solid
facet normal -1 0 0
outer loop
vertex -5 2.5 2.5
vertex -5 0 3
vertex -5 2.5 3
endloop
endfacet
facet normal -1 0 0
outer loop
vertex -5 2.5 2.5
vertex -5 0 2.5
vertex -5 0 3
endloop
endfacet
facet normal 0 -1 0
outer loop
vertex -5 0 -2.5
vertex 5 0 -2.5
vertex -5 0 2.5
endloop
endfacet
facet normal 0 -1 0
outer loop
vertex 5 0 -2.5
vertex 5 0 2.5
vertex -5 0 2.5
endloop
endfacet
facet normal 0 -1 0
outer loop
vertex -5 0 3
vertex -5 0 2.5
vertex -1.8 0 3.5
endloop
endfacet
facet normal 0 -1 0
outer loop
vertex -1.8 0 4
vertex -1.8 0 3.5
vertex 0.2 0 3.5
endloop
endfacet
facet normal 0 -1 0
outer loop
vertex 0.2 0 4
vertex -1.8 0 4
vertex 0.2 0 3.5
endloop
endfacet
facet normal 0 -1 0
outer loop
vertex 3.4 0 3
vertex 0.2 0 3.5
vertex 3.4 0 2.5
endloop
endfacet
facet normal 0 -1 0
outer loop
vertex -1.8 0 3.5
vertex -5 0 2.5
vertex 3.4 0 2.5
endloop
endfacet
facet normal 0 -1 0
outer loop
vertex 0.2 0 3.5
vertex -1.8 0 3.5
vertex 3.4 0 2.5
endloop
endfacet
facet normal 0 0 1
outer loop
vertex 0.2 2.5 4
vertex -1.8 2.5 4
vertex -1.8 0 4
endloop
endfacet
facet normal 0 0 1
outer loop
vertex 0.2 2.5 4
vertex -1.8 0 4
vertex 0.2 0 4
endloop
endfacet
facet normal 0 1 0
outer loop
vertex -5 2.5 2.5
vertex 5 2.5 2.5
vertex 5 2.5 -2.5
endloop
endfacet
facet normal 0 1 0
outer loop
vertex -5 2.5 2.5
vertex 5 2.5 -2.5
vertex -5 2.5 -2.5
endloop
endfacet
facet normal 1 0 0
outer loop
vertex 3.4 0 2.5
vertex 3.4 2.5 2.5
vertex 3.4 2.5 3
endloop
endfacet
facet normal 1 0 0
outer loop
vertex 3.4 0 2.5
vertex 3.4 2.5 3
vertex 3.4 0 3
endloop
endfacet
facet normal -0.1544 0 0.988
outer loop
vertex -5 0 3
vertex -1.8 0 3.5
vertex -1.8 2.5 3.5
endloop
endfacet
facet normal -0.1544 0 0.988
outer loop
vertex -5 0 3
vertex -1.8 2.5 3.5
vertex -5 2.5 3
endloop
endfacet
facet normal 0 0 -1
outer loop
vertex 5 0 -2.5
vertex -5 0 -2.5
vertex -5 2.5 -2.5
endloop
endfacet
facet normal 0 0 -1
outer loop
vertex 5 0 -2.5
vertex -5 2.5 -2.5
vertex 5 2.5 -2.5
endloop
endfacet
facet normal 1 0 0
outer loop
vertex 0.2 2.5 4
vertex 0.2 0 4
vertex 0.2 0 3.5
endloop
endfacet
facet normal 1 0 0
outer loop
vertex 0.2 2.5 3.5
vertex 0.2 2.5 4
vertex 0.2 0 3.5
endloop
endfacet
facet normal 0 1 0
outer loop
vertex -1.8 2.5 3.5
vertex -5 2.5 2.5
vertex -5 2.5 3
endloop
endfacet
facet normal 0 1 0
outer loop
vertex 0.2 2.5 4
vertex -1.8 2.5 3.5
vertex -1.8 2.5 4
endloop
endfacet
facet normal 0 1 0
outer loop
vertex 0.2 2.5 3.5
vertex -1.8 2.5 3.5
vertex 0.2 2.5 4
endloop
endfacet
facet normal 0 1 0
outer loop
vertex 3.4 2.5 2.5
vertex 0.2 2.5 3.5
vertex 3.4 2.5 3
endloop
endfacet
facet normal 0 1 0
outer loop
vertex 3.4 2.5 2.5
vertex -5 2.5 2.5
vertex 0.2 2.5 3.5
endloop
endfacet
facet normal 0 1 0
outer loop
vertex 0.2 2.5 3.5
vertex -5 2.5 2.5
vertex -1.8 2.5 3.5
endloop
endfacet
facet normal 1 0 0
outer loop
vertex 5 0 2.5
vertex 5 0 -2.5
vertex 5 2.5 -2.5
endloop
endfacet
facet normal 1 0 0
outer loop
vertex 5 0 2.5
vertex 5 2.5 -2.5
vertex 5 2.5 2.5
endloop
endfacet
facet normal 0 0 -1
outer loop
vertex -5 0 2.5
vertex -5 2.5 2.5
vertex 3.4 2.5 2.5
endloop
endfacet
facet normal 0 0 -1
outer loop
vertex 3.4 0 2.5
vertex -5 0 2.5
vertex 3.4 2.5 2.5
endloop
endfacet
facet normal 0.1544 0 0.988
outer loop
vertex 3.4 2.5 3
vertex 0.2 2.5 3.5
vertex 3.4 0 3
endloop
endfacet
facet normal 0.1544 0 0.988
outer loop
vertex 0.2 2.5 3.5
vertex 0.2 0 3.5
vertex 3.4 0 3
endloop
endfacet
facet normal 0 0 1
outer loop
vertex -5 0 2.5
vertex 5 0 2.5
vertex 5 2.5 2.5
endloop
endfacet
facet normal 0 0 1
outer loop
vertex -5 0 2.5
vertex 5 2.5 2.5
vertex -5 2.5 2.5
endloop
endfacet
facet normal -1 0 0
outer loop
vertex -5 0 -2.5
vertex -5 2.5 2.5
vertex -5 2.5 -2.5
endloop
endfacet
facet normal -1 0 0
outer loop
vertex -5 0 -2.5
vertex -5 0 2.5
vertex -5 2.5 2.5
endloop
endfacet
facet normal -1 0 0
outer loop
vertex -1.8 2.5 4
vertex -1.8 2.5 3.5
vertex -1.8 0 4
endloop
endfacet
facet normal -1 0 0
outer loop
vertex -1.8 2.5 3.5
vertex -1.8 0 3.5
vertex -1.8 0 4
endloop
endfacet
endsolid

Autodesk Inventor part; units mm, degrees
ref_plane "YZ Plane" through (0, 0, 0) normal (1, 0, 0) x (0, 1, 0)
ref_plane "XZ Plane" through (0, 0, 0) normal (0, 1, 0) x (-1, 0, 0)
ref_plane "XY Plane" through (0, 0, 0) normal (0, 0, 1) x (1, 0, 0)
sketch "Sketch1" plane through (0, 0, 0) normal (0, 1, 0) x (-1, 0, 0)
  line L0 (5, -2.5) -> (-5, -2.5)
  line L1 (-5, -2.5) -> (-5, 2.5)
  line L2 (-5, 2.5) -> (5, 2.5)
  line L3 (5, 2.5) -> (5, -2.5)
  line L4 (5, -2.5) -> (-5, 2.5) construction
  line L5 (-5, -2.5) -> (5, 2.5) construction
  point P0 (0, 0)
  dimension "d0" = 10
  dimension "d1" = 5
extrude "Extrusion1" add sketch "Sketch1" along normal blind 2.5
sketch "Sketch2" plane through (-5, 0, 2.5) normal (0, 0, 1) x (1, 0, 0)
  line L0 (0, 2.5) -> (10, 2.5) projected
  line L1 (0, 0) -> (10, 0) projected
  line L2 (0, 2.5) -> (8.4, 2.5)
  line L3 (8.4, 2.5) -> (8.4, 0)
  line L4 (8.4, 0) -> (0, 0)
  line L5 (0, 0) -> (0, 2.5)
  point P0 (5, 0)
  dimension "d4" = 8.4
extrude "Extrusion2" add sketch "Sketch2" along normal blind 1.5 separate body
sketch "Sketch3" plane through (-5, 0, 2.5) normal (0, -1, 0) x (1, 0, 0)
  line L0 (0, 1.5) -> (8.4, 1.5) projected
  line L1 (3.2, 1.5) -> (5.2, 1.5)
  line L2 (5.2, 1.5) -> (5.2, 1)
  line L3 (5.2, 1) -> (3.2, 1)
  line L4 (3.2, 1) -> (3.2, 1.5)
  line L5 (0, 0) -> (10, 0) projected
  line L6 (8.4, 0) -> (8.4, 1.5) projected
  line L7 (0, 0) -> (8.4, 0)
  line L8 (8.4, 0) -> (8.4, 0.5)
  line L9 (8.4, 0.5) -> (0, 0.5)
  line L10 (0, 0.5) -> (0, 0)
  line L11 (3.2, 1) -> (0, 0.5)
  line L12 (5.2, 1) -> (8.4, 0.5)
  line L13 (0, 1.5) -> (8.4, 1.5)
  line L14 (8.4, 1.5) -> (8.4, 0)
  line L15 (8.4, 0) -> (0, 0)
  line L16 (0, 0) -> (0, 1.5)
  point P0 (5, -2.5)
  point P1 (0, 0.5)
  dimension "d7" = 2
  dimension "d8" = 0.5
  dimension "d9" = 0.5
extrude "Extrusion3" cut sketch "Sketch3" against normal through all contours L0 L4 L11 L16 | L0 L6 L12 L2 bodies 2
properties part number "Switch_ESP2010_90"
